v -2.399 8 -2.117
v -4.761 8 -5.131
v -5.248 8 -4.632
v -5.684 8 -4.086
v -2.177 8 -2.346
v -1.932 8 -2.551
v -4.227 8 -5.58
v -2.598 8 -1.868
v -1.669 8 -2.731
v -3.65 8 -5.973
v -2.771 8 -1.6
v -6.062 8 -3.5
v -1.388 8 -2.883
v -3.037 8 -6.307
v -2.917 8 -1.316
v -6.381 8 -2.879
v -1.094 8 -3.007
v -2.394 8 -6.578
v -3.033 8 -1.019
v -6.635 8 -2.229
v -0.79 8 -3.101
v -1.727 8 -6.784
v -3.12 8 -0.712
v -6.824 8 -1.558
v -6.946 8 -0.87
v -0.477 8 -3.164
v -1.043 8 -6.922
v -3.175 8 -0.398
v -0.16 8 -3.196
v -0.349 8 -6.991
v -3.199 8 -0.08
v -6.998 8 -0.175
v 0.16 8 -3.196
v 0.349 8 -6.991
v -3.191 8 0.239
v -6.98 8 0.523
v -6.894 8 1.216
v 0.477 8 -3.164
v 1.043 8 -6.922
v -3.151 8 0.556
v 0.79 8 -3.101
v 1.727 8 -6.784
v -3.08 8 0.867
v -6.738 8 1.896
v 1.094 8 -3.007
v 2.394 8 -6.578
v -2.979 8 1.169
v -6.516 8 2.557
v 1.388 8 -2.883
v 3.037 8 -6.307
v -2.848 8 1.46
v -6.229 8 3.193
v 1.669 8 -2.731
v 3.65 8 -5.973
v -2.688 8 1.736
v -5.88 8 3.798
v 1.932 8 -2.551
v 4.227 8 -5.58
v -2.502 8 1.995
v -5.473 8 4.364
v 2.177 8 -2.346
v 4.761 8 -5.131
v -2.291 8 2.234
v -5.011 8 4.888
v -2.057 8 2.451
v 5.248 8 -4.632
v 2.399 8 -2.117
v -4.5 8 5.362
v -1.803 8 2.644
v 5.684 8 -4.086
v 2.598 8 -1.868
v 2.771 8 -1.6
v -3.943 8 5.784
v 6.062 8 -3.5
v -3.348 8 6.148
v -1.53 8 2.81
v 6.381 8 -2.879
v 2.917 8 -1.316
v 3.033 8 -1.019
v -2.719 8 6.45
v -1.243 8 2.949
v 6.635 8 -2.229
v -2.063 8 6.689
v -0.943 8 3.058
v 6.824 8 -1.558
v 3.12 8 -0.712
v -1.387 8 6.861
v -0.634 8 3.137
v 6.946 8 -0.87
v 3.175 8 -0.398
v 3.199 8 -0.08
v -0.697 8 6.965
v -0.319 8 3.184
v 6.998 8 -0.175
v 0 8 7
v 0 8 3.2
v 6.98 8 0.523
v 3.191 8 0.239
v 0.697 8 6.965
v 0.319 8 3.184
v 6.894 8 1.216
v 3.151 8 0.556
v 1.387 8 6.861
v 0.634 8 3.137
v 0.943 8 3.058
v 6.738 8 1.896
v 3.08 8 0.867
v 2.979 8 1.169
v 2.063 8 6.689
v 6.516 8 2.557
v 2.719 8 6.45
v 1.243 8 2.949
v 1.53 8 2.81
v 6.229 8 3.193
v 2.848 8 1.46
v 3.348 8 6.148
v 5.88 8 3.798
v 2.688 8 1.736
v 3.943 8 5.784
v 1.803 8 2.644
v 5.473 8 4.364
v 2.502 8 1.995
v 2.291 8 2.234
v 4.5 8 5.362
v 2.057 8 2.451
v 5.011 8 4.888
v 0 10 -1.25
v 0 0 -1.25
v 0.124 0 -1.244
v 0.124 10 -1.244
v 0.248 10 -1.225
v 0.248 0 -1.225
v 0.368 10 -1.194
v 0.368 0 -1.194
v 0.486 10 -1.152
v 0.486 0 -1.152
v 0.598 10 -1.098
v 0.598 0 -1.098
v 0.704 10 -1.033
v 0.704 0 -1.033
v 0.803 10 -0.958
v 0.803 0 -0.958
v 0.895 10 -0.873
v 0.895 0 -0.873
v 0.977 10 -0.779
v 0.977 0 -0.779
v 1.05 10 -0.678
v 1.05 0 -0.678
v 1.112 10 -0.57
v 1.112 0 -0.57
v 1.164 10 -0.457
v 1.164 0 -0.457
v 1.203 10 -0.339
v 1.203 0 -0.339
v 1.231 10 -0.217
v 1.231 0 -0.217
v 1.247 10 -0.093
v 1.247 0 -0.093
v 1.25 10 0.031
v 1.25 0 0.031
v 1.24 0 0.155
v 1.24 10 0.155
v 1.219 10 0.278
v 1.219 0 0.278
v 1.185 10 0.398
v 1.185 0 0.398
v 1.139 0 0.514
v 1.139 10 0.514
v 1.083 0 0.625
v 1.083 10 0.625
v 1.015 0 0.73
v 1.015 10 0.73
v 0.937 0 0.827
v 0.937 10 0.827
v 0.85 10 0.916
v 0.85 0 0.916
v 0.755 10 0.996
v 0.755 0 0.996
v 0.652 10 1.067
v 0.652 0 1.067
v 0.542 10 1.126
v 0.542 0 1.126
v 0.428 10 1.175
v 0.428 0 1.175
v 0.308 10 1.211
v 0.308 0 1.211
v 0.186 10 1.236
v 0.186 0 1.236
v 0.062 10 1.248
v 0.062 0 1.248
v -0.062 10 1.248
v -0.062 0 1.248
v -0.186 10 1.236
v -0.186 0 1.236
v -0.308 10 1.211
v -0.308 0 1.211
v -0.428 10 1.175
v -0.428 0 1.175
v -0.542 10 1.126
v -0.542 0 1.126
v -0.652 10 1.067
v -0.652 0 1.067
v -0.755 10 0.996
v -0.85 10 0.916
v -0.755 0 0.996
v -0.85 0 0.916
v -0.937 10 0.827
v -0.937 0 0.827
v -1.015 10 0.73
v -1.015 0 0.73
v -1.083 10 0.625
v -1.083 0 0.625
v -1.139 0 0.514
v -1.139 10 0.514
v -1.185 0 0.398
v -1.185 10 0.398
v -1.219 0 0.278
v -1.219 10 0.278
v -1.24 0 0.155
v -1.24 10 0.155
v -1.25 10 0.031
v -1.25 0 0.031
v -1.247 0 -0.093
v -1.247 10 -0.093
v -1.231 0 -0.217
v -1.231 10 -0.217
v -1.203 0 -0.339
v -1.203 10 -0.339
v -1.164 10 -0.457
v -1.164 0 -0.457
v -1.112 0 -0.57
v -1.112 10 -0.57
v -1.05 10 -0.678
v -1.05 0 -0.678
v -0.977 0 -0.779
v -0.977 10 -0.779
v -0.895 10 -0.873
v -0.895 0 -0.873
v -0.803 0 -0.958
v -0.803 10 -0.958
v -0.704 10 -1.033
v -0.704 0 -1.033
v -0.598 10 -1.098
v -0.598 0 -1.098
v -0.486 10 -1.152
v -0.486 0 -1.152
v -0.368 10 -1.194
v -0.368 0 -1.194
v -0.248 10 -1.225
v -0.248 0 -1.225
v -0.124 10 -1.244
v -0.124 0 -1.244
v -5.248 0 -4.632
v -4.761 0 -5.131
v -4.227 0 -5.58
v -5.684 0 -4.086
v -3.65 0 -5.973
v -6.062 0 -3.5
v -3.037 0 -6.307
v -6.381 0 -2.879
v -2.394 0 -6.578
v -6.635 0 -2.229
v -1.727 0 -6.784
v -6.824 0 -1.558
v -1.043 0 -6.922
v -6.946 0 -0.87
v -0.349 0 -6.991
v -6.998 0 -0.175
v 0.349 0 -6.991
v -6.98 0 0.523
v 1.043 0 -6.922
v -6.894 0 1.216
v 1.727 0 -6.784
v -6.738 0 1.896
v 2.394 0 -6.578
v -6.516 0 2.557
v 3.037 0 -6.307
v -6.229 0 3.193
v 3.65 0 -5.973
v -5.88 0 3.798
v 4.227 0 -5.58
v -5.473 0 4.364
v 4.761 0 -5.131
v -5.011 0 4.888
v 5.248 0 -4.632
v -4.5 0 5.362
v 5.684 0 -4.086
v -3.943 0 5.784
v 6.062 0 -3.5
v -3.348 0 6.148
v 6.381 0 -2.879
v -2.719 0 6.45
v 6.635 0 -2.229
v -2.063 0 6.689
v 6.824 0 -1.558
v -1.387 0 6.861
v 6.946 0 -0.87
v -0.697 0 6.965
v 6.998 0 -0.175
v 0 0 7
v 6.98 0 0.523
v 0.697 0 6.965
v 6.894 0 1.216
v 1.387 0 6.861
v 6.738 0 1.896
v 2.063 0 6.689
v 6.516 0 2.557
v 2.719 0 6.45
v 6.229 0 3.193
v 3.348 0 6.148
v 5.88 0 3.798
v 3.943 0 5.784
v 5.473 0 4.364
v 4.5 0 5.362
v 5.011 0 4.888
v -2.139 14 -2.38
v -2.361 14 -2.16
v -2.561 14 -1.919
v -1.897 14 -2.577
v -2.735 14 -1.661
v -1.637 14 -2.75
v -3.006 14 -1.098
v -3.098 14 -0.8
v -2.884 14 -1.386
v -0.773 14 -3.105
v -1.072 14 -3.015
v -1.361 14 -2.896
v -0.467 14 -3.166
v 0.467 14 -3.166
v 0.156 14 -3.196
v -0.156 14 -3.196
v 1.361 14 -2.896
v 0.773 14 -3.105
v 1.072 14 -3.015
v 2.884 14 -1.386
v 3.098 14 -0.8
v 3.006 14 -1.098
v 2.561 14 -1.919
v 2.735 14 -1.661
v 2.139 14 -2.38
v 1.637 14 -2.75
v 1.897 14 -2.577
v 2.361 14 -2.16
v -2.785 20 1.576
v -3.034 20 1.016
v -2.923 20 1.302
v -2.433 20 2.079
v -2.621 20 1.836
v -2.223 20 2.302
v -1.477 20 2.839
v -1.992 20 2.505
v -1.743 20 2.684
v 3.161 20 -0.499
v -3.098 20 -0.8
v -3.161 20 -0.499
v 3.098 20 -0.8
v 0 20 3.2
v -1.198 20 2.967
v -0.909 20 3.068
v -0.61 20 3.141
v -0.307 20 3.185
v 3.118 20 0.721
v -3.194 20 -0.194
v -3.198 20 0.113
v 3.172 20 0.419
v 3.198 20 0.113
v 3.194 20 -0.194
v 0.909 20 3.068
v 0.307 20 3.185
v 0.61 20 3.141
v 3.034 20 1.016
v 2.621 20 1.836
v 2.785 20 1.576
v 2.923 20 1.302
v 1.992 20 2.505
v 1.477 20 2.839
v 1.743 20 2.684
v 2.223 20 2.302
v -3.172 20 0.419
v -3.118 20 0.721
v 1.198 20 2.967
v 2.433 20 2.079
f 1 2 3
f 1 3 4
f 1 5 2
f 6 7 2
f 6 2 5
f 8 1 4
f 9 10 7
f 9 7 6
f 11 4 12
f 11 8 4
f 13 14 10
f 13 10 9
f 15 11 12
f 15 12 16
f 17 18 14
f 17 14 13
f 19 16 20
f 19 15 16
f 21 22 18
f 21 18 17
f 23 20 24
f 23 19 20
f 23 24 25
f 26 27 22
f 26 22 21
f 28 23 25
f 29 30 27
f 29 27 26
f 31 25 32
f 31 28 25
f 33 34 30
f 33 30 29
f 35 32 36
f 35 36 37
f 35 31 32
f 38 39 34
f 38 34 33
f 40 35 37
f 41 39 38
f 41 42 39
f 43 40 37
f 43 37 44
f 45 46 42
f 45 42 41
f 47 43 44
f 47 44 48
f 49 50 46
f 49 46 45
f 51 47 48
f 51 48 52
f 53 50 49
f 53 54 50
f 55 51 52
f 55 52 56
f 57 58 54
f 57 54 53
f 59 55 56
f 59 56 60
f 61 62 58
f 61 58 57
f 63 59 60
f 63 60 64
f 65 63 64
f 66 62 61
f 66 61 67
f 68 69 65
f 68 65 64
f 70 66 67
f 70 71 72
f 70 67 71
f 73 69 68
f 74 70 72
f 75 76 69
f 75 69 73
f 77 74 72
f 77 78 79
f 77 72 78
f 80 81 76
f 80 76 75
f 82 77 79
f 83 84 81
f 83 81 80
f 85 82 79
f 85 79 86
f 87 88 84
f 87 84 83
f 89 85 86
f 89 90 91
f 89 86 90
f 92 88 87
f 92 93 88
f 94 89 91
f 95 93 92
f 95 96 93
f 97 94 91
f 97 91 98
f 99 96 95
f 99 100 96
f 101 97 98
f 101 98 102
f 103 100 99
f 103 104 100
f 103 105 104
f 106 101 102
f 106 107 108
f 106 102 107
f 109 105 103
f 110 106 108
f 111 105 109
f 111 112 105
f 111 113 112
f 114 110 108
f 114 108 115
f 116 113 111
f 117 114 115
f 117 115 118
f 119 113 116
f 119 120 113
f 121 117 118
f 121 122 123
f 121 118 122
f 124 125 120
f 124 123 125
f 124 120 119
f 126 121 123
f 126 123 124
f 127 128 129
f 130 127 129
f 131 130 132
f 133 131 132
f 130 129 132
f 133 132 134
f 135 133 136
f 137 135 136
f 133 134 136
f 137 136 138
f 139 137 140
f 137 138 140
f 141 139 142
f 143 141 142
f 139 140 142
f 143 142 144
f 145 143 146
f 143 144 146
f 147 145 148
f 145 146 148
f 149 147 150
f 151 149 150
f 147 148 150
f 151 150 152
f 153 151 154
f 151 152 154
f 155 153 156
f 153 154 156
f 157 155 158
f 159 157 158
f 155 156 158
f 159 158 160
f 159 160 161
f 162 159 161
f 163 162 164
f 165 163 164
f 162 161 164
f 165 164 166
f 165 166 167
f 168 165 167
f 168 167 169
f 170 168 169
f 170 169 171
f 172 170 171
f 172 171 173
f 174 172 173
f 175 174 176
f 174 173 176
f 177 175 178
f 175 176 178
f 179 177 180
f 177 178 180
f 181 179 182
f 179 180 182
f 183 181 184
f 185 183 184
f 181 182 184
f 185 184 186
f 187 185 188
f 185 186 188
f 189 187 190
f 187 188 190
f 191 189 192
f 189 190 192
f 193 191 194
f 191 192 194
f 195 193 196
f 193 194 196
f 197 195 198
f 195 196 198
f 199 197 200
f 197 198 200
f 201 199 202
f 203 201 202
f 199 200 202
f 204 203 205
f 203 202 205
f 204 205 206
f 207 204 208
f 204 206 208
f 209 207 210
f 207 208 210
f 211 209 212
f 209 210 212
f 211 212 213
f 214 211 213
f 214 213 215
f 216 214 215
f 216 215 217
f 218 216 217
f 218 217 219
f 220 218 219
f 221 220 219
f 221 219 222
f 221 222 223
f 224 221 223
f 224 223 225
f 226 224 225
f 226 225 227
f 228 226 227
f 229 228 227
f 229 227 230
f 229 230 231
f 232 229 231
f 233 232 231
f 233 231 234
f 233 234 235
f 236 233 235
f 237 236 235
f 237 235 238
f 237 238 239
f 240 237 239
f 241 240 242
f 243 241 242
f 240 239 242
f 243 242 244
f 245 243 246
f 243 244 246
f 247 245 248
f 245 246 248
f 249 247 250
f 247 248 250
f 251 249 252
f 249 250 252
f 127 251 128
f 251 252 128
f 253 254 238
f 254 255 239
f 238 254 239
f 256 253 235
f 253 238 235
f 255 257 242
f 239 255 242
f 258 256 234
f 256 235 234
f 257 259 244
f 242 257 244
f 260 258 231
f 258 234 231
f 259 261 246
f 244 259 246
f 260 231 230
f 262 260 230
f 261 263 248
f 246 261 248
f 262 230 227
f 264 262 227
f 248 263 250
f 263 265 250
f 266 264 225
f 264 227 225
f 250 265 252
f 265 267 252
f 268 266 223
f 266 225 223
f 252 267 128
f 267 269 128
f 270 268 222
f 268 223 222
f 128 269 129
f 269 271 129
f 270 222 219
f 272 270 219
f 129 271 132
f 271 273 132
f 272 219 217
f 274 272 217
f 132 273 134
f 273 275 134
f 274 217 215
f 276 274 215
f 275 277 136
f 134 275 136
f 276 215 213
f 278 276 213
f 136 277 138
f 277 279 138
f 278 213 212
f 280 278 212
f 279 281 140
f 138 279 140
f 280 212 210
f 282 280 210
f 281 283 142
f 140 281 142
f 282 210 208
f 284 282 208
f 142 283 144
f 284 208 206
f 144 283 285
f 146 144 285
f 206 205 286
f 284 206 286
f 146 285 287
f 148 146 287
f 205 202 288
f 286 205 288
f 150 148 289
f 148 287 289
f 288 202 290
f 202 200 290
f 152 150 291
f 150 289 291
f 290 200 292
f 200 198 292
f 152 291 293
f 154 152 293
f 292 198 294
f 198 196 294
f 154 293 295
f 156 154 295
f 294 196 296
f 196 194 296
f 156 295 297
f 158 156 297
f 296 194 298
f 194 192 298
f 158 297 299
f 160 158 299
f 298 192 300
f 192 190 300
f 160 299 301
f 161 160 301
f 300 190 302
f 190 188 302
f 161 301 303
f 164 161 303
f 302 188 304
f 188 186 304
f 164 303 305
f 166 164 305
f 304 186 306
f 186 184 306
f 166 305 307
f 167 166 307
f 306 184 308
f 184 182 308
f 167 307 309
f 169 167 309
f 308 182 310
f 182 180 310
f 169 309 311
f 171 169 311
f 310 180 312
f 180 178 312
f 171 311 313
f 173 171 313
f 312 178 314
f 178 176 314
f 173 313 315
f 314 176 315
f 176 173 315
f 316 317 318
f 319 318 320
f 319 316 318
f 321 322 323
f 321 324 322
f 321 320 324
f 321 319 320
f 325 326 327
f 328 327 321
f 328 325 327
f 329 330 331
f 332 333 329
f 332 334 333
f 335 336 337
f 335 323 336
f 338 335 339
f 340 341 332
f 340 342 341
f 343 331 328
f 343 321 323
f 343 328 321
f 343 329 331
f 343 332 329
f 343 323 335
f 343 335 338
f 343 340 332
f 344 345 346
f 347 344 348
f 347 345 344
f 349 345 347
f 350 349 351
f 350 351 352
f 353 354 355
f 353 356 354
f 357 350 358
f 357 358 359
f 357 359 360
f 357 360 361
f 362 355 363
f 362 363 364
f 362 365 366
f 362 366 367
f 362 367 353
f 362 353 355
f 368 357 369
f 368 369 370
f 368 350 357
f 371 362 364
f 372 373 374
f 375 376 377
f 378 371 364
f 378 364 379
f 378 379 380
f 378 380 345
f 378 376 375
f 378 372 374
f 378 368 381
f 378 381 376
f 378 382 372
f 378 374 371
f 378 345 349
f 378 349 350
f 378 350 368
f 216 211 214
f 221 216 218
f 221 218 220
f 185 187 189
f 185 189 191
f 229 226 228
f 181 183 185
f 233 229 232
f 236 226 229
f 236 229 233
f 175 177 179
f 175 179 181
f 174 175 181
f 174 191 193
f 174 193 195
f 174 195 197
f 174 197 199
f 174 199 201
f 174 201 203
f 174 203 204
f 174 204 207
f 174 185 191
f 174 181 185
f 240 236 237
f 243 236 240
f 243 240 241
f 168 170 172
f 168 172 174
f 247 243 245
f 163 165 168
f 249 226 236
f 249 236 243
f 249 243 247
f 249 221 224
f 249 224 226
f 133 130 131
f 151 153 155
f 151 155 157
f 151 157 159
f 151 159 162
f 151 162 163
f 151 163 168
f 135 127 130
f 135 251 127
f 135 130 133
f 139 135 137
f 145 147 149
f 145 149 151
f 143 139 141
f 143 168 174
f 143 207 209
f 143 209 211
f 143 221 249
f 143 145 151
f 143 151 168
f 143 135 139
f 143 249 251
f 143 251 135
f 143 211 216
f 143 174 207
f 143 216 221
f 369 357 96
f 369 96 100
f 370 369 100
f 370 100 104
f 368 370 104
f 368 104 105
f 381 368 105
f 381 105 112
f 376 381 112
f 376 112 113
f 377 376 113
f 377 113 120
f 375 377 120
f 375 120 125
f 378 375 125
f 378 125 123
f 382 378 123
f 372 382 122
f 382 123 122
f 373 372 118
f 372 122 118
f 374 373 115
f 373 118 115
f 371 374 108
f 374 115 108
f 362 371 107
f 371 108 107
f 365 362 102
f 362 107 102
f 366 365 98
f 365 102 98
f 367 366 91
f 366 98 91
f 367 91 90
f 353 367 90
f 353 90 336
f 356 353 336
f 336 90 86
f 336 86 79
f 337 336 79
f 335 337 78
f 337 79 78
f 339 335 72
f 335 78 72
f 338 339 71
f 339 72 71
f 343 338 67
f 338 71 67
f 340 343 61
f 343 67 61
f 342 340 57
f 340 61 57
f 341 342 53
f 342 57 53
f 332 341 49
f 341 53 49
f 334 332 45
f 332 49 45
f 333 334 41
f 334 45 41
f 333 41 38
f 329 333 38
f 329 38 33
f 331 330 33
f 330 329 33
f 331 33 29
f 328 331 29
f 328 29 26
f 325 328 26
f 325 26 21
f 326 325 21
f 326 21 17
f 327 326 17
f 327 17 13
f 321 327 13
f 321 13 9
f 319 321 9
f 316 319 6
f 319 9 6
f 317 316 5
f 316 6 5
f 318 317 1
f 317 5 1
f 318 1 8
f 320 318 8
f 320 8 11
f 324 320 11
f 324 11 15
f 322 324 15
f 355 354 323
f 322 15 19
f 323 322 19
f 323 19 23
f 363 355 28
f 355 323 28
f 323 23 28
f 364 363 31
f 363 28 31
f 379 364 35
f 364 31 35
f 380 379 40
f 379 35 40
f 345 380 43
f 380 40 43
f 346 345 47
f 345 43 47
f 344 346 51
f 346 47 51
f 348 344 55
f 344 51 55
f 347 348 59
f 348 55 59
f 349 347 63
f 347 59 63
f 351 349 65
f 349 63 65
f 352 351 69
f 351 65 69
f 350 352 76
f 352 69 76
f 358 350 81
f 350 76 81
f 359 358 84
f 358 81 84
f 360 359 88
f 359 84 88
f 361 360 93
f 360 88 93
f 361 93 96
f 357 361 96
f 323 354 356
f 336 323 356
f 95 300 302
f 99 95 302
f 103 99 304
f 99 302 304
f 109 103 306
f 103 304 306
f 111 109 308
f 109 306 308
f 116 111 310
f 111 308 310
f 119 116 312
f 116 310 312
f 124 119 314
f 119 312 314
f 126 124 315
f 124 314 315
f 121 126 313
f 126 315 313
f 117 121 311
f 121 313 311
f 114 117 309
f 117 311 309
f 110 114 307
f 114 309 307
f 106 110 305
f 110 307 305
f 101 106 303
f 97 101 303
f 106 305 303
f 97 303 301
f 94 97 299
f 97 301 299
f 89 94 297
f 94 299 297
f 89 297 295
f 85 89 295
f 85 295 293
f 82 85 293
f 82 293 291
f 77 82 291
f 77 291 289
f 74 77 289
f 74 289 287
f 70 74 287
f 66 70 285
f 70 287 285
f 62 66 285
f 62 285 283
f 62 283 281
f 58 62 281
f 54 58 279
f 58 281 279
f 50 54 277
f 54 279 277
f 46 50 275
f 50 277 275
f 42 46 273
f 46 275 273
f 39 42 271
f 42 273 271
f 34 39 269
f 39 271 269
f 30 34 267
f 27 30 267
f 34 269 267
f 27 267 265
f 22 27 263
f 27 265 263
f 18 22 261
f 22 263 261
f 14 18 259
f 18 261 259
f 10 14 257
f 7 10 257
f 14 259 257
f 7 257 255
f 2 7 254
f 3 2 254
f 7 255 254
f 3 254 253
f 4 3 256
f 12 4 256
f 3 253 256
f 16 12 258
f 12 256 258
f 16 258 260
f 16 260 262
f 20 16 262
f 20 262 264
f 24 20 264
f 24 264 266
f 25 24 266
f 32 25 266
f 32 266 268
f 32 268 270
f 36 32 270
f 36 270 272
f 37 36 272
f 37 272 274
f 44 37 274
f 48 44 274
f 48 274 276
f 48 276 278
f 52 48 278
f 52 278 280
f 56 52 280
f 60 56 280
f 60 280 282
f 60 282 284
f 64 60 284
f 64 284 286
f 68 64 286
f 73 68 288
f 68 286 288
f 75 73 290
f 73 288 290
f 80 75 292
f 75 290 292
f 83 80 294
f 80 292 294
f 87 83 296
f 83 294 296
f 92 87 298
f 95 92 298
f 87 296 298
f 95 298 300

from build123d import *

# Parameters (mm, degrees)
SKETCH1_R           = 7
BOSS_EXTRUDE1_DEPTH = 8
SKETCH2_R           = 3.2
BOSS_EXTRUDE2_DEPTH = 12
SKETCH3_W           = 6.196773354
SKETCH3_H           = 3.205100748
CUT_EXTRUDE1_DEPTH  = 6
SKETCH4_R           = 1.25
CUT_EXTRUDE2_DEPTH  = 10


with BuildPart() as part:
    # Sketch1 → Boss-Extrude1 (new body)
    with BuildSketch(Plane(origin=(0, 0, 0), x_dir=(1, 0, 0), z_dir=(0, 1, 0))):
        with Locations(Location((0, 0, 0), (0, 0, 270))):
            Circle(SKETCH1_R)
    extrude(amount=BOSS_EXTRUDE1_DEPTH)

    # Sketch2 → Boss-Extrude2 (add)
    with BuildSketch(Plane(origin=(0, 8, 0), x_dir=(1, 0, 0), z_dir=(0, 1, 0))):
        with Locations(Location((0, 0, 0), (0, 0, 270))):
            Circle(SKETCH2_R)
    extrude(amount=BOSS_EXTRUDE2_DEPTH)

    # Sketch3 → Cut-Extrude1 (cut)
    with BuildSketch(Plane(origin=(0, 20, 0), x_dir=(1, 0, 0), z_dir=(0, 1, 0))):
        with Locations((0, 2.402550374)):
            Rectangle(SKETCH3_W, SKETCH3_H)
    extrude(amount=-CUT_EXTRUDE1_DEPTH, mode=Mode.SUBTRACT)

    # Sketch4 → Cut-Extrude2 (cut)
    with BuildSketch(Plane.XZ):
        with Locations(Location((0, 0, 0), (0, 0, 270))):
            Circle(SKETCH4_R)
    extrude(amount=-CUT_EXTRUDE2_DEPTH, mode=Mode.SUBTRACT)


solid = part.part
